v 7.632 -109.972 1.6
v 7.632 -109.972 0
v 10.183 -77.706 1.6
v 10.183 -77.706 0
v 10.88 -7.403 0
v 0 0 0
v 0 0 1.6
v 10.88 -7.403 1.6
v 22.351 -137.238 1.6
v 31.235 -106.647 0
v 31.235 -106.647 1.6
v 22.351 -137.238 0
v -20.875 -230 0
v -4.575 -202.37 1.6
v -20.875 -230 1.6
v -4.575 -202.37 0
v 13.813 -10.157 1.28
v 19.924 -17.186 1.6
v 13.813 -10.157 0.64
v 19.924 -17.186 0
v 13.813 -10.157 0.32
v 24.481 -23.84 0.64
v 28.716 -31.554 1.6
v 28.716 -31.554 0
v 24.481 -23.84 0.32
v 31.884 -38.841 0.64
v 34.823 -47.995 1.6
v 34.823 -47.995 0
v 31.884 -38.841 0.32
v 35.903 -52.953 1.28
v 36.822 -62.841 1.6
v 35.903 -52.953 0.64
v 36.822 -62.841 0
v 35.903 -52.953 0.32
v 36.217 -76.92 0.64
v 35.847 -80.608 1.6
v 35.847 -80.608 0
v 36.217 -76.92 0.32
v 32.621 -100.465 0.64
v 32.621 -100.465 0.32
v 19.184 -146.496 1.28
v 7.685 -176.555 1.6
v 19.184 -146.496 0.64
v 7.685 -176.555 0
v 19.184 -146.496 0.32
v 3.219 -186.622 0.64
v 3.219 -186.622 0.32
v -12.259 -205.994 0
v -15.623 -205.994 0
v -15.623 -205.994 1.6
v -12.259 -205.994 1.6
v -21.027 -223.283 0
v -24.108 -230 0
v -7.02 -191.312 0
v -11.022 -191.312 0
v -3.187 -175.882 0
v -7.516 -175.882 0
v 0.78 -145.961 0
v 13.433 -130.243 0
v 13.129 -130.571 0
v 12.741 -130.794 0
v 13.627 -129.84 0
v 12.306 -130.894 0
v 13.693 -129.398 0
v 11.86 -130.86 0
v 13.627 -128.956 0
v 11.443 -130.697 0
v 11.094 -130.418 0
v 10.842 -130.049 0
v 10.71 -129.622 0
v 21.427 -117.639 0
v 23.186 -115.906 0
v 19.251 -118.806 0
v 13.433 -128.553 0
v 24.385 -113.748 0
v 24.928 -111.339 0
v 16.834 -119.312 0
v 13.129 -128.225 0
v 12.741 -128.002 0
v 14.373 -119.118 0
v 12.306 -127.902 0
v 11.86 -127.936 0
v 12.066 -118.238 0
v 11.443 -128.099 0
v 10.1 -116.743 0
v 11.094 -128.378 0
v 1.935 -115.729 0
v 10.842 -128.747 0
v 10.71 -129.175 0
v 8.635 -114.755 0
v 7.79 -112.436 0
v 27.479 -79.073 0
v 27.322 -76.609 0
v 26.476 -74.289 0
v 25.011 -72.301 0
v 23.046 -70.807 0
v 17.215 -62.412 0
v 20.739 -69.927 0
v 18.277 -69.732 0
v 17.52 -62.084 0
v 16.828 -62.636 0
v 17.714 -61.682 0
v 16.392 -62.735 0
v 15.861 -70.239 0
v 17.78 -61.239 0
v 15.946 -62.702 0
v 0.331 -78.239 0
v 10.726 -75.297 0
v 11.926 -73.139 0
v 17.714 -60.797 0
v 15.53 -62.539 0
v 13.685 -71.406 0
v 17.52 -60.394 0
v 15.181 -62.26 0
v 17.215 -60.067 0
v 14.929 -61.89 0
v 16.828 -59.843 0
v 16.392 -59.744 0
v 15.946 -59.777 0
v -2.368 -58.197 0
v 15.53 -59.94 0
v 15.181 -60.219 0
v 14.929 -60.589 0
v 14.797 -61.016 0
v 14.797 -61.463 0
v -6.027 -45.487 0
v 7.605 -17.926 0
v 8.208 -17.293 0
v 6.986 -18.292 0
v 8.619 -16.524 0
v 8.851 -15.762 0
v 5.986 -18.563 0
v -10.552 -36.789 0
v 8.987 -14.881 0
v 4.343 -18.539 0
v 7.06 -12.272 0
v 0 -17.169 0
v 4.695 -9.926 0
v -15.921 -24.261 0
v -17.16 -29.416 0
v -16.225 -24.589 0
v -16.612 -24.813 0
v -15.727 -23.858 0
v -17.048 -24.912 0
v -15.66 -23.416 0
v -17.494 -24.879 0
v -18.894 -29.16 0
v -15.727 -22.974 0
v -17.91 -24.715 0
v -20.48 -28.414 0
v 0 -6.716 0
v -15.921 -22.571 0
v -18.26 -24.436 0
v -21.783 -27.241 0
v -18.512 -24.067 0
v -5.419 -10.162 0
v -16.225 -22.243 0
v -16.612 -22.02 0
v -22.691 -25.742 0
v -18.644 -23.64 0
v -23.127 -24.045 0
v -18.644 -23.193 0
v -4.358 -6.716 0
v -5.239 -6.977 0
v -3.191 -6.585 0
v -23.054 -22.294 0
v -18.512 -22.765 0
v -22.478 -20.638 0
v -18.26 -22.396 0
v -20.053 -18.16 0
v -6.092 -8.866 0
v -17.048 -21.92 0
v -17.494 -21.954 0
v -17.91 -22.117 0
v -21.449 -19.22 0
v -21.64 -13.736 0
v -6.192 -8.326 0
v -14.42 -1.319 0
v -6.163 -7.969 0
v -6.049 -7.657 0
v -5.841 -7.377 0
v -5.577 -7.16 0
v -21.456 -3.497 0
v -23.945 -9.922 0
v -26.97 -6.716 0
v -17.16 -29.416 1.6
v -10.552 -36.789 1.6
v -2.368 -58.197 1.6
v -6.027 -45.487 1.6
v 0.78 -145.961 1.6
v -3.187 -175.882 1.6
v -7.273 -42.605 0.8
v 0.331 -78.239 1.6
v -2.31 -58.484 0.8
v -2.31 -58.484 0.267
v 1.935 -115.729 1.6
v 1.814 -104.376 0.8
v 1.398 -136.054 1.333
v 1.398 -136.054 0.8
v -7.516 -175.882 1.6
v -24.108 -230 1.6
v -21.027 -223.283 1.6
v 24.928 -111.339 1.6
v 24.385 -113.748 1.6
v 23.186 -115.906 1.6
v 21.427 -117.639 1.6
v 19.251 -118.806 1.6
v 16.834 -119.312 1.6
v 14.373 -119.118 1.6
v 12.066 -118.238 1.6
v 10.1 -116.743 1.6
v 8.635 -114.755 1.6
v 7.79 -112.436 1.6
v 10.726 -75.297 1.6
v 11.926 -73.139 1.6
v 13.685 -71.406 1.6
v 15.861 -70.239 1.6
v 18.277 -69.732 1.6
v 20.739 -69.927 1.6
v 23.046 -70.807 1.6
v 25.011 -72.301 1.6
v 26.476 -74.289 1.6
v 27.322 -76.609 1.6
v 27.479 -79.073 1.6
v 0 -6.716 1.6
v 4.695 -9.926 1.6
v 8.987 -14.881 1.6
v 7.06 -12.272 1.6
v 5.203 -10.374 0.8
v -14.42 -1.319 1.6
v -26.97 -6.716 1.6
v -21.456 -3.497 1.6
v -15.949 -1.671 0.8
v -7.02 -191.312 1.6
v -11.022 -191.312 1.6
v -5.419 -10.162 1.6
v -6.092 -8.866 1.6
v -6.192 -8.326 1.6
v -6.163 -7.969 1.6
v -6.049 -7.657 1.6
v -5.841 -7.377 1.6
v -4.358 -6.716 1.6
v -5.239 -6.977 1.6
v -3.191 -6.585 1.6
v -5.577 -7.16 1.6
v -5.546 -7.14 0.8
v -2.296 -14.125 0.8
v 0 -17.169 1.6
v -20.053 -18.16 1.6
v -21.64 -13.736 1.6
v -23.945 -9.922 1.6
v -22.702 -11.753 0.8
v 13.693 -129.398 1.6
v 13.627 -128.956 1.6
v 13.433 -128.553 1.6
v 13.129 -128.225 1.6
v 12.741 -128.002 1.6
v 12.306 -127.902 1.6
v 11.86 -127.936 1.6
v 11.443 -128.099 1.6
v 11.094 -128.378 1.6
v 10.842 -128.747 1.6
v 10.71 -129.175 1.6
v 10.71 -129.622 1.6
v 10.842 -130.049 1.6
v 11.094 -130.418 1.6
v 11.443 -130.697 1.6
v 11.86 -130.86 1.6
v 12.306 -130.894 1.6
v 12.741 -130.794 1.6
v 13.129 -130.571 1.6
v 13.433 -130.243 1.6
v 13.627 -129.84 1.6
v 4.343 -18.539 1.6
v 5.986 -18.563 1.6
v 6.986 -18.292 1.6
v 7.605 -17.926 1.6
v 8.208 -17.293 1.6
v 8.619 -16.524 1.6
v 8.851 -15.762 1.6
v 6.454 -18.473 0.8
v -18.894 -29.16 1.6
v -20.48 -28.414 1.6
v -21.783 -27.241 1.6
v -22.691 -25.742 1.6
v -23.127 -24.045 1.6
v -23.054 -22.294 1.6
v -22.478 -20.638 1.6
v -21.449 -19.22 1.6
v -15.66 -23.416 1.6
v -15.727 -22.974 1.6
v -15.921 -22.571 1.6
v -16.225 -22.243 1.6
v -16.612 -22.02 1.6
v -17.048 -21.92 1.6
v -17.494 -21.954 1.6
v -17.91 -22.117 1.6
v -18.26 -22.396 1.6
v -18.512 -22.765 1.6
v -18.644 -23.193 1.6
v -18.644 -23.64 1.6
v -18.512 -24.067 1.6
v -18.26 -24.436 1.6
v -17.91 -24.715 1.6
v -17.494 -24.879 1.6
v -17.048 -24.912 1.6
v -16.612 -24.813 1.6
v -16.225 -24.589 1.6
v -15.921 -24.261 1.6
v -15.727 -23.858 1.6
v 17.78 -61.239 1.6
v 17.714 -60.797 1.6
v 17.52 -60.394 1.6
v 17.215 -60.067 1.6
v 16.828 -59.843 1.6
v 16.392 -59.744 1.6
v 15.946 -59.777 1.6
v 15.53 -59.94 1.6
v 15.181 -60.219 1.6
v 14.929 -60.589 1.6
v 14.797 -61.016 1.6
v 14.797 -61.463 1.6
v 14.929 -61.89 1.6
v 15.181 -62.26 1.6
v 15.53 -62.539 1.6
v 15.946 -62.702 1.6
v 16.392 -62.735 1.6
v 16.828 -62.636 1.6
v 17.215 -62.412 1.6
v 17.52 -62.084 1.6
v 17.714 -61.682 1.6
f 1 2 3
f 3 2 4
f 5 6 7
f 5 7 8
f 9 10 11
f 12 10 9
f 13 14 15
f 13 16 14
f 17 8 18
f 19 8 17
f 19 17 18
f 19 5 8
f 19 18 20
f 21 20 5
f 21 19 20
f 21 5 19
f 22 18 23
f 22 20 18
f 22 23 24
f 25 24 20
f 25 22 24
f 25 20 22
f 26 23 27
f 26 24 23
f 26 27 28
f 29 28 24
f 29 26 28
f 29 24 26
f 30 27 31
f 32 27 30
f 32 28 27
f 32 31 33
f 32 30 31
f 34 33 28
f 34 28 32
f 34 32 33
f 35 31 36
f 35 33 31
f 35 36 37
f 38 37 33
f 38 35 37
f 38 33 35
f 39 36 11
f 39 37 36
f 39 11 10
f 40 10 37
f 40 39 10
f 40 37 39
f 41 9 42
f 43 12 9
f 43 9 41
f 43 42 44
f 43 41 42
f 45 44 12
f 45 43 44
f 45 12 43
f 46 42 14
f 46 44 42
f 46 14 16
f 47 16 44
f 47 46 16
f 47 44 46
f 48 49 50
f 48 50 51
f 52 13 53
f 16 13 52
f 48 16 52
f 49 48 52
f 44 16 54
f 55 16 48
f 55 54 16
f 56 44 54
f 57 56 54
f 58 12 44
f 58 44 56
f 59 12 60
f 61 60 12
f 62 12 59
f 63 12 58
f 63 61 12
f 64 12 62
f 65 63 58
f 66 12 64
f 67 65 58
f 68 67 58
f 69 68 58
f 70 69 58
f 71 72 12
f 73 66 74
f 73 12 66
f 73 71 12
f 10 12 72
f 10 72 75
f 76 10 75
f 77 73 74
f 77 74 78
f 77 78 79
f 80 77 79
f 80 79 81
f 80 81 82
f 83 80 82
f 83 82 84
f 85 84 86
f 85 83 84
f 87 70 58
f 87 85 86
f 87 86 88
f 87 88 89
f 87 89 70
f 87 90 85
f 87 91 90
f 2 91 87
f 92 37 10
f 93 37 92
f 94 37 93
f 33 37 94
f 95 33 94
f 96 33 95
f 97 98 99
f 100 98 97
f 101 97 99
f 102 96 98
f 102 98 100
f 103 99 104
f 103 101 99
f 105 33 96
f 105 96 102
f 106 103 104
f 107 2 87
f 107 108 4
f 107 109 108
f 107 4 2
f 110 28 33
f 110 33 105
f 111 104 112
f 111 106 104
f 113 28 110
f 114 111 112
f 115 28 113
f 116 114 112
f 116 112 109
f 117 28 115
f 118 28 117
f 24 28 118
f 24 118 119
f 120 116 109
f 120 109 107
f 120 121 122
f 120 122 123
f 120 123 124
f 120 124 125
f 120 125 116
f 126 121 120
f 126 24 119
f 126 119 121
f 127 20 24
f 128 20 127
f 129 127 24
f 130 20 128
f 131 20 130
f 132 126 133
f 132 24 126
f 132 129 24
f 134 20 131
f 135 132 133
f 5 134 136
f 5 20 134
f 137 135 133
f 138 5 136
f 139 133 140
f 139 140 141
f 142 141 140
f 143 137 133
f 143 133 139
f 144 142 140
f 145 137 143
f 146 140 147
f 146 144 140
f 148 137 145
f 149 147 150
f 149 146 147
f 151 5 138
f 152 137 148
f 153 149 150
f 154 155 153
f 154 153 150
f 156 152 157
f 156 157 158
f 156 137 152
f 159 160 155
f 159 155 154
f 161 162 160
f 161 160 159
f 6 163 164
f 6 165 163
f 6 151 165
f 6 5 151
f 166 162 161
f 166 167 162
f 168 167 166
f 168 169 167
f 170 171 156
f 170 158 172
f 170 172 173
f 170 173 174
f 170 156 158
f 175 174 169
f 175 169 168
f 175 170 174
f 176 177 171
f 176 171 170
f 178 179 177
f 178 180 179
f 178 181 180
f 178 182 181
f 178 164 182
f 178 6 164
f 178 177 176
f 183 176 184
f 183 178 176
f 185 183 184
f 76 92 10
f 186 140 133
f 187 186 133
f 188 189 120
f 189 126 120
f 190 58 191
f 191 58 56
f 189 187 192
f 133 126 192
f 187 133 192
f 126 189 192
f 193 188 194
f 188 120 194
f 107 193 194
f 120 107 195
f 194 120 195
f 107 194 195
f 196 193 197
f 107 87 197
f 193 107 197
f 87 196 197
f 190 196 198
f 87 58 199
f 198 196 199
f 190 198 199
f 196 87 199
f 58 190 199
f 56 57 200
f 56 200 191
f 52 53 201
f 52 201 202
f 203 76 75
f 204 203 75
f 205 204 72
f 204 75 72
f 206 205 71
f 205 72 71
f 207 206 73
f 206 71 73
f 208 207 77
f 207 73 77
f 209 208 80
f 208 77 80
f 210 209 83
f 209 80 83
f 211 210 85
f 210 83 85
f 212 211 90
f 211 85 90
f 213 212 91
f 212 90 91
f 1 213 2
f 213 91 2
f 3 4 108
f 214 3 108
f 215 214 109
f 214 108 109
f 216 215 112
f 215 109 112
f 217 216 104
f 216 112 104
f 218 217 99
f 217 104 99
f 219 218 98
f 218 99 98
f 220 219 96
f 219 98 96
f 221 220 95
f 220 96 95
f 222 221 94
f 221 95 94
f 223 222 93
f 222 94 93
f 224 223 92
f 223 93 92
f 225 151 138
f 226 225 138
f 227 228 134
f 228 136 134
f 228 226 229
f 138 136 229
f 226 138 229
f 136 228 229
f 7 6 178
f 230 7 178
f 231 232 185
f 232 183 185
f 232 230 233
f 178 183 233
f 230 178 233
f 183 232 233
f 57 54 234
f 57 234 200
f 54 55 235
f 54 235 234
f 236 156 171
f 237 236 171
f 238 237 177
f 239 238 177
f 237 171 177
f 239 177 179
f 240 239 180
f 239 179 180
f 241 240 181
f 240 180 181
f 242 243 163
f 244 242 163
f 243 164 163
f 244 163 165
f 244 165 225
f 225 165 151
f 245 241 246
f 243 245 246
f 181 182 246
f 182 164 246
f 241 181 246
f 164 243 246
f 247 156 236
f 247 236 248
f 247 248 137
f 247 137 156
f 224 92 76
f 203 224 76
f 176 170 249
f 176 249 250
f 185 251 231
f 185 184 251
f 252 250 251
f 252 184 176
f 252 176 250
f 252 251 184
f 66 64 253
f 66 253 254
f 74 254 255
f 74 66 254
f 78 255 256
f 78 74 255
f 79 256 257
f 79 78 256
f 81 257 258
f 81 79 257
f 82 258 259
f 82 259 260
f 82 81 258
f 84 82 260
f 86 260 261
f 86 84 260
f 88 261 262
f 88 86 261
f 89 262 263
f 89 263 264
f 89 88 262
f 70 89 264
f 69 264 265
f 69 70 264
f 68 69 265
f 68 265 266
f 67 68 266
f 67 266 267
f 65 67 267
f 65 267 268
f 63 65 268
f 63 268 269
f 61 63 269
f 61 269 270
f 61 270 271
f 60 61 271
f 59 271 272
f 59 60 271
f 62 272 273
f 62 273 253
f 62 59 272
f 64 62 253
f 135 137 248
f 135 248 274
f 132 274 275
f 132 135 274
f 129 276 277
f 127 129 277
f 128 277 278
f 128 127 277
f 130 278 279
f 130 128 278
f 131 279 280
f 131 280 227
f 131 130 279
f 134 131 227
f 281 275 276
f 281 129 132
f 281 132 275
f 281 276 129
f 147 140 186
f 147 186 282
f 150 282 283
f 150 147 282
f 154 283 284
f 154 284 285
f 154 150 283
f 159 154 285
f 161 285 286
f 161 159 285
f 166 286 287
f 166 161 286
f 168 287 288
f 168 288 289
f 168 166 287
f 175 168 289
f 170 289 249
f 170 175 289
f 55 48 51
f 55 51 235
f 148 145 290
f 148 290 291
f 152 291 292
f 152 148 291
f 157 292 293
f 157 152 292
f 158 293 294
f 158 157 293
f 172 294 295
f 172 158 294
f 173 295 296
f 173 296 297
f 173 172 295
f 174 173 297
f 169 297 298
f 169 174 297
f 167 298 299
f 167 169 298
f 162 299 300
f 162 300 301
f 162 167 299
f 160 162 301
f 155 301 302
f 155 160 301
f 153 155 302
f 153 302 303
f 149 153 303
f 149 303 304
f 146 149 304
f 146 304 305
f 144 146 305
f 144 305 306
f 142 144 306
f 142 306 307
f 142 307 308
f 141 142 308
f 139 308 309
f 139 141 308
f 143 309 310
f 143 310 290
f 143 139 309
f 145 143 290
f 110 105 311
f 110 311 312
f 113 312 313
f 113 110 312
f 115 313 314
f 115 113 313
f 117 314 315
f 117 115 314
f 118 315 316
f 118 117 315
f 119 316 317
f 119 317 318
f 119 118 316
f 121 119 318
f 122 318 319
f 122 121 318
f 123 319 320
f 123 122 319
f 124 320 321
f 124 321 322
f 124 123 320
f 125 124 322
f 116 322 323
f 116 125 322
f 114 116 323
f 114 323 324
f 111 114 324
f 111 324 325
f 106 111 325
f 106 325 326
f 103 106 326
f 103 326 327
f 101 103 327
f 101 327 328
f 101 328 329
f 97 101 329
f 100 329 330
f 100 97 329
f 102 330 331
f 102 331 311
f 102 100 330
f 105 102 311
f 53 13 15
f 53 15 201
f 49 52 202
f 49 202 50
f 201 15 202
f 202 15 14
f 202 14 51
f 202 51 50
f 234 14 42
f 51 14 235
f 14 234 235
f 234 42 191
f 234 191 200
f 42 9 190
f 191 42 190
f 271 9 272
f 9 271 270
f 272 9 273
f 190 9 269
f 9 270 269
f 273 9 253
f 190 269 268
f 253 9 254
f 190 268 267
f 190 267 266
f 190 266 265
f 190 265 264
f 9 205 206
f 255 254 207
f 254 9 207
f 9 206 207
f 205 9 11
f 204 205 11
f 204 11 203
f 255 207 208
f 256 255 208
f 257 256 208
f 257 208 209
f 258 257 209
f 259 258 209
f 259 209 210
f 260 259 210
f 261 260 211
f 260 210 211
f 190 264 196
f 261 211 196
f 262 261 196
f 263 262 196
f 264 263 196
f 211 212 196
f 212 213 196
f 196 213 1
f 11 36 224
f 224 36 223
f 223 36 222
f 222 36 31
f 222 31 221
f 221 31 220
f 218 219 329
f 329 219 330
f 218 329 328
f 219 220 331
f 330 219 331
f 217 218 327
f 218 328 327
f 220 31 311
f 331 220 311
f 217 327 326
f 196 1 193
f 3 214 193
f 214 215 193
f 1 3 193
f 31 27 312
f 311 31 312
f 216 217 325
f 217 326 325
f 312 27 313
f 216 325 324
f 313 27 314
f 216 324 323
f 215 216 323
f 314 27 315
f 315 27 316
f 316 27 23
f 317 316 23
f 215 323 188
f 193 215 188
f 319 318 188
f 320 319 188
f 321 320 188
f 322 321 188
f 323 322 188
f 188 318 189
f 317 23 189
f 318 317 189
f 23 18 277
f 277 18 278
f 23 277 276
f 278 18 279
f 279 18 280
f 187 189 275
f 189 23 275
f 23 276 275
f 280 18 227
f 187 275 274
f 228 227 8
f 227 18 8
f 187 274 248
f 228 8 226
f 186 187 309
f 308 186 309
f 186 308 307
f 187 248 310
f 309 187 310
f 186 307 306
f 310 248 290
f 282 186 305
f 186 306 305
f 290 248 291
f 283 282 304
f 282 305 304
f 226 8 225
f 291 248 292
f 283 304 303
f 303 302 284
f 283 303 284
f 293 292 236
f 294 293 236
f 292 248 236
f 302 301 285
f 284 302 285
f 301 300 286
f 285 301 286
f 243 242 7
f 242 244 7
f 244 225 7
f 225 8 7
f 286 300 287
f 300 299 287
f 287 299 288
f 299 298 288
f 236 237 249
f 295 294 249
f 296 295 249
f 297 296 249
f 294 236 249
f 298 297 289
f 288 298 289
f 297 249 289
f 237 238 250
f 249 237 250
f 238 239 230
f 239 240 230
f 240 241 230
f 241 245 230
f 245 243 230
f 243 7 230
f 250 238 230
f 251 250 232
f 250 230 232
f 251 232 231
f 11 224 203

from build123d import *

# Parameters (mm, degrees)
SKETCH1_R           = 1.5
BOSS_EXTRUDE1_DEPTH = 1.6


with BuildPart() as part:
    # Sketch1 → Boss-Extrude1 (new body)
    with BuildSketch(Plane.XY):
        with BuildLine():
            Line((-20.874762199, -230), (-24.107625058, -230))
            Line((-24.107625058, -230), (-21.027218593, -223.282895617))
            Line((-21.027218593, -223.282895617), (-15.623003046, -205.993906437))
            Line((-15.623003046, -205.993906437), (-12.258960606, -205.993906437))
            Line((-12.258960606, -205.993906437), (-11.02173816, -191.31161689))
            Line((-11.02173816, -191.31161689), (-7.020102822, -191.31161689))
            Line((-7.020102822, -191.31161689), (-7.516012532, -175.88188489))
            Line((-7.516012532, -175.88188489), (-3.18703669, -175.88188489))
            add(Edge.make_bspline(
                [(-17.160324035, -29.416207169), (-8.398371011, -36.733475706), (-2.571584268, -52.968698778), (0.661081287, -79.111086987), (2.205082084, -105.054570559), (1.837795255, -131.716022715), (0.137887281, -155.634013966), (-1.771940833, -168.867741352), (-3.18703669, -175.88188489)],
                knots=[0, 0, 0, 0, 0.158482103, 0.237210378, 0.379017678, 0.53054003, 0.61967816, 0.722683629, 0.722683629, 0.722683629, 0.722683629], degree=3))
            ThreePointArc((-17.160324035, -29.416207169), (-22.971518283, -24.909532791), (-20.052992456, -18.15954764))
            add(Edge.make_bspline(
                [(-20.052992456, -18.15954764), (-21.89358239, -11.067218771), (-26.969657726, -6.716297054)],
                knots=[0, 0, 0, 1, 1, 1], degree=2))
            add(Edge.make_bspline(
                [(0, 0), (-18.413441466, 0.016463282), (-26.969657726, -6.716297054)],
                knots=[0, 0, 0, 1, 1, 1], degree=2))
            add(Edge.make_bspline(
                [(0, 0), (20.459575306, -10.212191847), (34.566285194, -39.231713158), (36.993052452, -61.467711483), (36.226383018, -93.493922569), (19.759790723, -148.8717222), (-0.764820519, -199.159242317), (-20.874762199, -230)],
                knots=[0, 0, 0, 0, 0.214563454, 0.244193693, 0.29630239, 0.633937328, 1, 1, 1, 1], degree=3))
        make_face()
        with Locations((-17.160324035, -23.416207169)):
            Circle(SKETCH1_R, mode=Mode.SUBTRACT)
        with Locations((16.280165713, -61.239474093)):
            Circle(SKETCH1_R, mode=Mode.SUBTRACT)
        with Locations((12.19348553, -129.398093126)):
            Circle(SKETCH1_R, mode=Mode.SUBTRACT)
        with BuildLine():
            Line((27.479182403, -79.073058371), (24.928147951, -111.338970141))
            ThreePointArc((24.928147951, -111.338970141), (15.596431722, -119.303218388), (7.632183475, -109.971502159))
            Line((7.632183475, -109.971502159), (10.183217928, -77.705590388))
            ThreePointArc((10.183217928, -77.705590388), (19.514934157, -69.741342142), (27.479182403, -79.073058371))
        make_face(mode=Mode.SUBTRACT)
        with BuildLine():
            add(Edge.make_bspline(
                [(0, -6.716297054), (5.911988438, -9.949488907), (8.987018452, -14.881049849)],
                knots=[0, 0, 0, 1, 1, 1], degree=2))
            add(Edge.make_bspline(
                [(0, -17.168840712), (8.415460642, -20.921041323), (8.987018452, -14.881049849)],
                knots=[0, 0, 0, 1, 1, 1], degree=2))
            add(Edge.make_bspline(
                [(-5.419356096, -10.162481193), (-1.881950972, -14.584237599), (0, -17.168840712)],
                knots=[0, 0, 0, 1, 1, 1], degree=2))
            add(Edge.make_bspline(
                [(-5.419356096, -10.162481193), (-8.382778562, -5.840753091), (0, -6.716297054)],
                knots=[0, 0, 0, 1, 1, 1], degree=2))
        make_face(mode=Mode.SUBTRACT)
    extrude(amount=BOSS_EXTRUDE1_DEPTH)


solid = part.part
